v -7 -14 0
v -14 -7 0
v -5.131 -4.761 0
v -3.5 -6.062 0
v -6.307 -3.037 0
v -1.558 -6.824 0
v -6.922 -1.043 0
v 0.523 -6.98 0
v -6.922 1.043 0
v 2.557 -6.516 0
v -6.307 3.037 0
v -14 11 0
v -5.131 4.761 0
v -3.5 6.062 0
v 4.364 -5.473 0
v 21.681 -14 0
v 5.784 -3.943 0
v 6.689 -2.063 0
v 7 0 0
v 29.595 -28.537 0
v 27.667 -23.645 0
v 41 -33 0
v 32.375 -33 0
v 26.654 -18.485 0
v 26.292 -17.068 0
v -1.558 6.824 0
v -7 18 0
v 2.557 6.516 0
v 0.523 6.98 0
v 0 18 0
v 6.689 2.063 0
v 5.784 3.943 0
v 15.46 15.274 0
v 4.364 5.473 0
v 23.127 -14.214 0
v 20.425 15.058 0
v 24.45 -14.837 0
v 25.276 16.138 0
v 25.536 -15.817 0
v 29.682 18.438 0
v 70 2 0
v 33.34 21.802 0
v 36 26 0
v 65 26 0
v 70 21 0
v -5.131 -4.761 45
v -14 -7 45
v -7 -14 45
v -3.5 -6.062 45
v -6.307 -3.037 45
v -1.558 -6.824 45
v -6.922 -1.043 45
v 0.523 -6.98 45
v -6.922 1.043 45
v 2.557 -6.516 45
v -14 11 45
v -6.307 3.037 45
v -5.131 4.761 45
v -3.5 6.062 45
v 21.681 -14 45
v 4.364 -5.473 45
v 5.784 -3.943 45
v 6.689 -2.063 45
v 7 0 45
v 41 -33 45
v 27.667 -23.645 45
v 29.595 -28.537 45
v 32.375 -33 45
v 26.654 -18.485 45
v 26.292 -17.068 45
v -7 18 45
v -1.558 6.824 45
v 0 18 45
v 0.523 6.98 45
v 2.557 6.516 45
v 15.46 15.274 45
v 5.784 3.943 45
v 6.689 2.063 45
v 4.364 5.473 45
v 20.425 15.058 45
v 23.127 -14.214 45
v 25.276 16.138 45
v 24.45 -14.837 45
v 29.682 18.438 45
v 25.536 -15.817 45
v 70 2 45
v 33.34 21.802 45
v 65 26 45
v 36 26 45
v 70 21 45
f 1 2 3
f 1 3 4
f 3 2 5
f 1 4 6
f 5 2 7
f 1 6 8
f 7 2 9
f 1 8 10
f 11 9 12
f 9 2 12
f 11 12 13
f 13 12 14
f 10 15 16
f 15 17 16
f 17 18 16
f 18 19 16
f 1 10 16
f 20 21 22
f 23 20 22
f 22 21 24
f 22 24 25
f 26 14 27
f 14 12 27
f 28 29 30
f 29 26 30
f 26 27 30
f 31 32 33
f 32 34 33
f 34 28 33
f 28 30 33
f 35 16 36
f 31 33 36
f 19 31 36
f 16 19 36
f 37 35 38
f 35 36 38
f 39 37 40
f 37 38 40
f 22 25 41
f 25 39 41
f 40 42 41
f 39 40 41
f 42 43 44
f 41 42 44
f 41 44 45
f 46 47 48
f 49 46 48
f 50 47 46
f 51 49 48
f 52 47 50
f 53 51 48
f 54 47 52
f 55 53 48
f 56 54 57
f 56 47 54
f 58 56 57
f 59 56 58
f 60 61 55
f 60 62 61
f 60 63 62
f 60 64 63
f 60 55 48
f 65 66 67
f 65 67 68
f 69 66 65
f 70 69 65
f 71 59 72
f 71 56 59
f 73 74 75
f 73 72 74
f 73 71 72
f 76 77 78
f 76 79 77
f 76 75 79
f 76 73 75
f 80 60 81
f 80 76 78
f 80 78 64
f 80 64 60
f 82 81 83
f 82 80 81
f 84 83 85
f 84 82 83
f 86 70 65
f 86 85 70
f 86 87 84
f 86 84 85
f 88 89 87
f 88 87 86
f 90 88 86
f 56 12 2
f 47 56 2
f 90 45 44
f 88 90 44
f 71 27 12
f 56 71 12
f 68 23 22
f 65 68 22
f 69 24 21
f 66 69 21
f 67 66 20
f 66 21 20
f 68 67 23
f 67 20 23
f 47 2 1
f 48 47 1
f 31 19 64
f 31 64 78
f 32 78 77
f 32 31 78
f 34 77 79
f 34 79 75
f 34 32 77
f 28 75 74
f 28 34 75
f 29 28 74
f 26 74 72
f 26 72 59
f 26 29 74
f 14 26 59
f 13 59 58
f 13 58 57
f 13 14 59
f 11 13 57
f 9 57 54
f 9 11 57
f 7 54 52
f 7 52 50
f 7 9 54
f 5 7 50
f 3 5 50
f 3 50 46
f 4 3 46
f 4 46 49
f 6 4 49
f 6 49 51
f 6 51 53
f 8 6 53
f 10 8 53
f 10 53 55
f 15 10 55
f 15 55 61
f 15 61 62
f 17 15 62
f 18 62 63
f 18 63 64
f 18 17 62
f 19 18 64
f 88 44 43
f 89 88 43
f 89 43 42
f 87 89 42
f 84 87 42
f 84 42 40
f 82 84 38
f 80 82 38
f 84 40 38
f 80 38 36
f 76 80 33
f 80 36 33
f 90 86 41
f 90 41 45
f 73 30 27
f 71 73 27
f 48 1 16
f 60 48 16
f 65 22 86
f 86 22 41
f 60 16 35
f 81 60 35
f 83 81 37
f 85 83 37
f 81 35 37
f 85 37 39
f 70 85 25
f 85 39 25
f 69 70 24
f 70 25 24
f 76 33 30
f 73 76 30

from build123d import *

# Parameters (mm, degrees)
SKETCH2_R           = 7
BOSS_EXTRUDE1_DEPTH = 45


with BuildPart() as part:
    # Sketch2 → Boss-Extrude1 (new body)
    with BuildSketch(Plane.XY):
        with BuildLine():
            Line((-14, 11), (-14, -7))
            Line((-14, -7), (-7, -14))
            Line((-7, -14), (21.680626854, -14))
            ThreePointArc((21.680626854, -14), (25.029243776, -15.286946714), (26.654064081, -18.485294118))
            ThreePointArc((26.654064081, -18.485294118), (28.520286549, -26.134616219), (32.37533784, -33))
            Line((32.37533784, -33), (41, -33))
            Line((41, -33), (70, 2))
            Line((70, 2), (70, 21))
            Line((70, 21), (65, 26))
            Line((65, 26), (36, 26))
            ThreePointArc((36, 26), (27.554449431, 17.143424137), (15.460180615, 15.273953031))
            Line((15.460180615, 15.273953031), (0, 18))
            Line((0, 18), (-7, 18))
            Line((-7, 18), (-14, 11))
        make_face()
        Circle(SKETCH2_R, mode=Mode.SUBTRACT)
    extrude(amount=BOSS_EXTRUDE1_DEPTH)


solid = part.part
